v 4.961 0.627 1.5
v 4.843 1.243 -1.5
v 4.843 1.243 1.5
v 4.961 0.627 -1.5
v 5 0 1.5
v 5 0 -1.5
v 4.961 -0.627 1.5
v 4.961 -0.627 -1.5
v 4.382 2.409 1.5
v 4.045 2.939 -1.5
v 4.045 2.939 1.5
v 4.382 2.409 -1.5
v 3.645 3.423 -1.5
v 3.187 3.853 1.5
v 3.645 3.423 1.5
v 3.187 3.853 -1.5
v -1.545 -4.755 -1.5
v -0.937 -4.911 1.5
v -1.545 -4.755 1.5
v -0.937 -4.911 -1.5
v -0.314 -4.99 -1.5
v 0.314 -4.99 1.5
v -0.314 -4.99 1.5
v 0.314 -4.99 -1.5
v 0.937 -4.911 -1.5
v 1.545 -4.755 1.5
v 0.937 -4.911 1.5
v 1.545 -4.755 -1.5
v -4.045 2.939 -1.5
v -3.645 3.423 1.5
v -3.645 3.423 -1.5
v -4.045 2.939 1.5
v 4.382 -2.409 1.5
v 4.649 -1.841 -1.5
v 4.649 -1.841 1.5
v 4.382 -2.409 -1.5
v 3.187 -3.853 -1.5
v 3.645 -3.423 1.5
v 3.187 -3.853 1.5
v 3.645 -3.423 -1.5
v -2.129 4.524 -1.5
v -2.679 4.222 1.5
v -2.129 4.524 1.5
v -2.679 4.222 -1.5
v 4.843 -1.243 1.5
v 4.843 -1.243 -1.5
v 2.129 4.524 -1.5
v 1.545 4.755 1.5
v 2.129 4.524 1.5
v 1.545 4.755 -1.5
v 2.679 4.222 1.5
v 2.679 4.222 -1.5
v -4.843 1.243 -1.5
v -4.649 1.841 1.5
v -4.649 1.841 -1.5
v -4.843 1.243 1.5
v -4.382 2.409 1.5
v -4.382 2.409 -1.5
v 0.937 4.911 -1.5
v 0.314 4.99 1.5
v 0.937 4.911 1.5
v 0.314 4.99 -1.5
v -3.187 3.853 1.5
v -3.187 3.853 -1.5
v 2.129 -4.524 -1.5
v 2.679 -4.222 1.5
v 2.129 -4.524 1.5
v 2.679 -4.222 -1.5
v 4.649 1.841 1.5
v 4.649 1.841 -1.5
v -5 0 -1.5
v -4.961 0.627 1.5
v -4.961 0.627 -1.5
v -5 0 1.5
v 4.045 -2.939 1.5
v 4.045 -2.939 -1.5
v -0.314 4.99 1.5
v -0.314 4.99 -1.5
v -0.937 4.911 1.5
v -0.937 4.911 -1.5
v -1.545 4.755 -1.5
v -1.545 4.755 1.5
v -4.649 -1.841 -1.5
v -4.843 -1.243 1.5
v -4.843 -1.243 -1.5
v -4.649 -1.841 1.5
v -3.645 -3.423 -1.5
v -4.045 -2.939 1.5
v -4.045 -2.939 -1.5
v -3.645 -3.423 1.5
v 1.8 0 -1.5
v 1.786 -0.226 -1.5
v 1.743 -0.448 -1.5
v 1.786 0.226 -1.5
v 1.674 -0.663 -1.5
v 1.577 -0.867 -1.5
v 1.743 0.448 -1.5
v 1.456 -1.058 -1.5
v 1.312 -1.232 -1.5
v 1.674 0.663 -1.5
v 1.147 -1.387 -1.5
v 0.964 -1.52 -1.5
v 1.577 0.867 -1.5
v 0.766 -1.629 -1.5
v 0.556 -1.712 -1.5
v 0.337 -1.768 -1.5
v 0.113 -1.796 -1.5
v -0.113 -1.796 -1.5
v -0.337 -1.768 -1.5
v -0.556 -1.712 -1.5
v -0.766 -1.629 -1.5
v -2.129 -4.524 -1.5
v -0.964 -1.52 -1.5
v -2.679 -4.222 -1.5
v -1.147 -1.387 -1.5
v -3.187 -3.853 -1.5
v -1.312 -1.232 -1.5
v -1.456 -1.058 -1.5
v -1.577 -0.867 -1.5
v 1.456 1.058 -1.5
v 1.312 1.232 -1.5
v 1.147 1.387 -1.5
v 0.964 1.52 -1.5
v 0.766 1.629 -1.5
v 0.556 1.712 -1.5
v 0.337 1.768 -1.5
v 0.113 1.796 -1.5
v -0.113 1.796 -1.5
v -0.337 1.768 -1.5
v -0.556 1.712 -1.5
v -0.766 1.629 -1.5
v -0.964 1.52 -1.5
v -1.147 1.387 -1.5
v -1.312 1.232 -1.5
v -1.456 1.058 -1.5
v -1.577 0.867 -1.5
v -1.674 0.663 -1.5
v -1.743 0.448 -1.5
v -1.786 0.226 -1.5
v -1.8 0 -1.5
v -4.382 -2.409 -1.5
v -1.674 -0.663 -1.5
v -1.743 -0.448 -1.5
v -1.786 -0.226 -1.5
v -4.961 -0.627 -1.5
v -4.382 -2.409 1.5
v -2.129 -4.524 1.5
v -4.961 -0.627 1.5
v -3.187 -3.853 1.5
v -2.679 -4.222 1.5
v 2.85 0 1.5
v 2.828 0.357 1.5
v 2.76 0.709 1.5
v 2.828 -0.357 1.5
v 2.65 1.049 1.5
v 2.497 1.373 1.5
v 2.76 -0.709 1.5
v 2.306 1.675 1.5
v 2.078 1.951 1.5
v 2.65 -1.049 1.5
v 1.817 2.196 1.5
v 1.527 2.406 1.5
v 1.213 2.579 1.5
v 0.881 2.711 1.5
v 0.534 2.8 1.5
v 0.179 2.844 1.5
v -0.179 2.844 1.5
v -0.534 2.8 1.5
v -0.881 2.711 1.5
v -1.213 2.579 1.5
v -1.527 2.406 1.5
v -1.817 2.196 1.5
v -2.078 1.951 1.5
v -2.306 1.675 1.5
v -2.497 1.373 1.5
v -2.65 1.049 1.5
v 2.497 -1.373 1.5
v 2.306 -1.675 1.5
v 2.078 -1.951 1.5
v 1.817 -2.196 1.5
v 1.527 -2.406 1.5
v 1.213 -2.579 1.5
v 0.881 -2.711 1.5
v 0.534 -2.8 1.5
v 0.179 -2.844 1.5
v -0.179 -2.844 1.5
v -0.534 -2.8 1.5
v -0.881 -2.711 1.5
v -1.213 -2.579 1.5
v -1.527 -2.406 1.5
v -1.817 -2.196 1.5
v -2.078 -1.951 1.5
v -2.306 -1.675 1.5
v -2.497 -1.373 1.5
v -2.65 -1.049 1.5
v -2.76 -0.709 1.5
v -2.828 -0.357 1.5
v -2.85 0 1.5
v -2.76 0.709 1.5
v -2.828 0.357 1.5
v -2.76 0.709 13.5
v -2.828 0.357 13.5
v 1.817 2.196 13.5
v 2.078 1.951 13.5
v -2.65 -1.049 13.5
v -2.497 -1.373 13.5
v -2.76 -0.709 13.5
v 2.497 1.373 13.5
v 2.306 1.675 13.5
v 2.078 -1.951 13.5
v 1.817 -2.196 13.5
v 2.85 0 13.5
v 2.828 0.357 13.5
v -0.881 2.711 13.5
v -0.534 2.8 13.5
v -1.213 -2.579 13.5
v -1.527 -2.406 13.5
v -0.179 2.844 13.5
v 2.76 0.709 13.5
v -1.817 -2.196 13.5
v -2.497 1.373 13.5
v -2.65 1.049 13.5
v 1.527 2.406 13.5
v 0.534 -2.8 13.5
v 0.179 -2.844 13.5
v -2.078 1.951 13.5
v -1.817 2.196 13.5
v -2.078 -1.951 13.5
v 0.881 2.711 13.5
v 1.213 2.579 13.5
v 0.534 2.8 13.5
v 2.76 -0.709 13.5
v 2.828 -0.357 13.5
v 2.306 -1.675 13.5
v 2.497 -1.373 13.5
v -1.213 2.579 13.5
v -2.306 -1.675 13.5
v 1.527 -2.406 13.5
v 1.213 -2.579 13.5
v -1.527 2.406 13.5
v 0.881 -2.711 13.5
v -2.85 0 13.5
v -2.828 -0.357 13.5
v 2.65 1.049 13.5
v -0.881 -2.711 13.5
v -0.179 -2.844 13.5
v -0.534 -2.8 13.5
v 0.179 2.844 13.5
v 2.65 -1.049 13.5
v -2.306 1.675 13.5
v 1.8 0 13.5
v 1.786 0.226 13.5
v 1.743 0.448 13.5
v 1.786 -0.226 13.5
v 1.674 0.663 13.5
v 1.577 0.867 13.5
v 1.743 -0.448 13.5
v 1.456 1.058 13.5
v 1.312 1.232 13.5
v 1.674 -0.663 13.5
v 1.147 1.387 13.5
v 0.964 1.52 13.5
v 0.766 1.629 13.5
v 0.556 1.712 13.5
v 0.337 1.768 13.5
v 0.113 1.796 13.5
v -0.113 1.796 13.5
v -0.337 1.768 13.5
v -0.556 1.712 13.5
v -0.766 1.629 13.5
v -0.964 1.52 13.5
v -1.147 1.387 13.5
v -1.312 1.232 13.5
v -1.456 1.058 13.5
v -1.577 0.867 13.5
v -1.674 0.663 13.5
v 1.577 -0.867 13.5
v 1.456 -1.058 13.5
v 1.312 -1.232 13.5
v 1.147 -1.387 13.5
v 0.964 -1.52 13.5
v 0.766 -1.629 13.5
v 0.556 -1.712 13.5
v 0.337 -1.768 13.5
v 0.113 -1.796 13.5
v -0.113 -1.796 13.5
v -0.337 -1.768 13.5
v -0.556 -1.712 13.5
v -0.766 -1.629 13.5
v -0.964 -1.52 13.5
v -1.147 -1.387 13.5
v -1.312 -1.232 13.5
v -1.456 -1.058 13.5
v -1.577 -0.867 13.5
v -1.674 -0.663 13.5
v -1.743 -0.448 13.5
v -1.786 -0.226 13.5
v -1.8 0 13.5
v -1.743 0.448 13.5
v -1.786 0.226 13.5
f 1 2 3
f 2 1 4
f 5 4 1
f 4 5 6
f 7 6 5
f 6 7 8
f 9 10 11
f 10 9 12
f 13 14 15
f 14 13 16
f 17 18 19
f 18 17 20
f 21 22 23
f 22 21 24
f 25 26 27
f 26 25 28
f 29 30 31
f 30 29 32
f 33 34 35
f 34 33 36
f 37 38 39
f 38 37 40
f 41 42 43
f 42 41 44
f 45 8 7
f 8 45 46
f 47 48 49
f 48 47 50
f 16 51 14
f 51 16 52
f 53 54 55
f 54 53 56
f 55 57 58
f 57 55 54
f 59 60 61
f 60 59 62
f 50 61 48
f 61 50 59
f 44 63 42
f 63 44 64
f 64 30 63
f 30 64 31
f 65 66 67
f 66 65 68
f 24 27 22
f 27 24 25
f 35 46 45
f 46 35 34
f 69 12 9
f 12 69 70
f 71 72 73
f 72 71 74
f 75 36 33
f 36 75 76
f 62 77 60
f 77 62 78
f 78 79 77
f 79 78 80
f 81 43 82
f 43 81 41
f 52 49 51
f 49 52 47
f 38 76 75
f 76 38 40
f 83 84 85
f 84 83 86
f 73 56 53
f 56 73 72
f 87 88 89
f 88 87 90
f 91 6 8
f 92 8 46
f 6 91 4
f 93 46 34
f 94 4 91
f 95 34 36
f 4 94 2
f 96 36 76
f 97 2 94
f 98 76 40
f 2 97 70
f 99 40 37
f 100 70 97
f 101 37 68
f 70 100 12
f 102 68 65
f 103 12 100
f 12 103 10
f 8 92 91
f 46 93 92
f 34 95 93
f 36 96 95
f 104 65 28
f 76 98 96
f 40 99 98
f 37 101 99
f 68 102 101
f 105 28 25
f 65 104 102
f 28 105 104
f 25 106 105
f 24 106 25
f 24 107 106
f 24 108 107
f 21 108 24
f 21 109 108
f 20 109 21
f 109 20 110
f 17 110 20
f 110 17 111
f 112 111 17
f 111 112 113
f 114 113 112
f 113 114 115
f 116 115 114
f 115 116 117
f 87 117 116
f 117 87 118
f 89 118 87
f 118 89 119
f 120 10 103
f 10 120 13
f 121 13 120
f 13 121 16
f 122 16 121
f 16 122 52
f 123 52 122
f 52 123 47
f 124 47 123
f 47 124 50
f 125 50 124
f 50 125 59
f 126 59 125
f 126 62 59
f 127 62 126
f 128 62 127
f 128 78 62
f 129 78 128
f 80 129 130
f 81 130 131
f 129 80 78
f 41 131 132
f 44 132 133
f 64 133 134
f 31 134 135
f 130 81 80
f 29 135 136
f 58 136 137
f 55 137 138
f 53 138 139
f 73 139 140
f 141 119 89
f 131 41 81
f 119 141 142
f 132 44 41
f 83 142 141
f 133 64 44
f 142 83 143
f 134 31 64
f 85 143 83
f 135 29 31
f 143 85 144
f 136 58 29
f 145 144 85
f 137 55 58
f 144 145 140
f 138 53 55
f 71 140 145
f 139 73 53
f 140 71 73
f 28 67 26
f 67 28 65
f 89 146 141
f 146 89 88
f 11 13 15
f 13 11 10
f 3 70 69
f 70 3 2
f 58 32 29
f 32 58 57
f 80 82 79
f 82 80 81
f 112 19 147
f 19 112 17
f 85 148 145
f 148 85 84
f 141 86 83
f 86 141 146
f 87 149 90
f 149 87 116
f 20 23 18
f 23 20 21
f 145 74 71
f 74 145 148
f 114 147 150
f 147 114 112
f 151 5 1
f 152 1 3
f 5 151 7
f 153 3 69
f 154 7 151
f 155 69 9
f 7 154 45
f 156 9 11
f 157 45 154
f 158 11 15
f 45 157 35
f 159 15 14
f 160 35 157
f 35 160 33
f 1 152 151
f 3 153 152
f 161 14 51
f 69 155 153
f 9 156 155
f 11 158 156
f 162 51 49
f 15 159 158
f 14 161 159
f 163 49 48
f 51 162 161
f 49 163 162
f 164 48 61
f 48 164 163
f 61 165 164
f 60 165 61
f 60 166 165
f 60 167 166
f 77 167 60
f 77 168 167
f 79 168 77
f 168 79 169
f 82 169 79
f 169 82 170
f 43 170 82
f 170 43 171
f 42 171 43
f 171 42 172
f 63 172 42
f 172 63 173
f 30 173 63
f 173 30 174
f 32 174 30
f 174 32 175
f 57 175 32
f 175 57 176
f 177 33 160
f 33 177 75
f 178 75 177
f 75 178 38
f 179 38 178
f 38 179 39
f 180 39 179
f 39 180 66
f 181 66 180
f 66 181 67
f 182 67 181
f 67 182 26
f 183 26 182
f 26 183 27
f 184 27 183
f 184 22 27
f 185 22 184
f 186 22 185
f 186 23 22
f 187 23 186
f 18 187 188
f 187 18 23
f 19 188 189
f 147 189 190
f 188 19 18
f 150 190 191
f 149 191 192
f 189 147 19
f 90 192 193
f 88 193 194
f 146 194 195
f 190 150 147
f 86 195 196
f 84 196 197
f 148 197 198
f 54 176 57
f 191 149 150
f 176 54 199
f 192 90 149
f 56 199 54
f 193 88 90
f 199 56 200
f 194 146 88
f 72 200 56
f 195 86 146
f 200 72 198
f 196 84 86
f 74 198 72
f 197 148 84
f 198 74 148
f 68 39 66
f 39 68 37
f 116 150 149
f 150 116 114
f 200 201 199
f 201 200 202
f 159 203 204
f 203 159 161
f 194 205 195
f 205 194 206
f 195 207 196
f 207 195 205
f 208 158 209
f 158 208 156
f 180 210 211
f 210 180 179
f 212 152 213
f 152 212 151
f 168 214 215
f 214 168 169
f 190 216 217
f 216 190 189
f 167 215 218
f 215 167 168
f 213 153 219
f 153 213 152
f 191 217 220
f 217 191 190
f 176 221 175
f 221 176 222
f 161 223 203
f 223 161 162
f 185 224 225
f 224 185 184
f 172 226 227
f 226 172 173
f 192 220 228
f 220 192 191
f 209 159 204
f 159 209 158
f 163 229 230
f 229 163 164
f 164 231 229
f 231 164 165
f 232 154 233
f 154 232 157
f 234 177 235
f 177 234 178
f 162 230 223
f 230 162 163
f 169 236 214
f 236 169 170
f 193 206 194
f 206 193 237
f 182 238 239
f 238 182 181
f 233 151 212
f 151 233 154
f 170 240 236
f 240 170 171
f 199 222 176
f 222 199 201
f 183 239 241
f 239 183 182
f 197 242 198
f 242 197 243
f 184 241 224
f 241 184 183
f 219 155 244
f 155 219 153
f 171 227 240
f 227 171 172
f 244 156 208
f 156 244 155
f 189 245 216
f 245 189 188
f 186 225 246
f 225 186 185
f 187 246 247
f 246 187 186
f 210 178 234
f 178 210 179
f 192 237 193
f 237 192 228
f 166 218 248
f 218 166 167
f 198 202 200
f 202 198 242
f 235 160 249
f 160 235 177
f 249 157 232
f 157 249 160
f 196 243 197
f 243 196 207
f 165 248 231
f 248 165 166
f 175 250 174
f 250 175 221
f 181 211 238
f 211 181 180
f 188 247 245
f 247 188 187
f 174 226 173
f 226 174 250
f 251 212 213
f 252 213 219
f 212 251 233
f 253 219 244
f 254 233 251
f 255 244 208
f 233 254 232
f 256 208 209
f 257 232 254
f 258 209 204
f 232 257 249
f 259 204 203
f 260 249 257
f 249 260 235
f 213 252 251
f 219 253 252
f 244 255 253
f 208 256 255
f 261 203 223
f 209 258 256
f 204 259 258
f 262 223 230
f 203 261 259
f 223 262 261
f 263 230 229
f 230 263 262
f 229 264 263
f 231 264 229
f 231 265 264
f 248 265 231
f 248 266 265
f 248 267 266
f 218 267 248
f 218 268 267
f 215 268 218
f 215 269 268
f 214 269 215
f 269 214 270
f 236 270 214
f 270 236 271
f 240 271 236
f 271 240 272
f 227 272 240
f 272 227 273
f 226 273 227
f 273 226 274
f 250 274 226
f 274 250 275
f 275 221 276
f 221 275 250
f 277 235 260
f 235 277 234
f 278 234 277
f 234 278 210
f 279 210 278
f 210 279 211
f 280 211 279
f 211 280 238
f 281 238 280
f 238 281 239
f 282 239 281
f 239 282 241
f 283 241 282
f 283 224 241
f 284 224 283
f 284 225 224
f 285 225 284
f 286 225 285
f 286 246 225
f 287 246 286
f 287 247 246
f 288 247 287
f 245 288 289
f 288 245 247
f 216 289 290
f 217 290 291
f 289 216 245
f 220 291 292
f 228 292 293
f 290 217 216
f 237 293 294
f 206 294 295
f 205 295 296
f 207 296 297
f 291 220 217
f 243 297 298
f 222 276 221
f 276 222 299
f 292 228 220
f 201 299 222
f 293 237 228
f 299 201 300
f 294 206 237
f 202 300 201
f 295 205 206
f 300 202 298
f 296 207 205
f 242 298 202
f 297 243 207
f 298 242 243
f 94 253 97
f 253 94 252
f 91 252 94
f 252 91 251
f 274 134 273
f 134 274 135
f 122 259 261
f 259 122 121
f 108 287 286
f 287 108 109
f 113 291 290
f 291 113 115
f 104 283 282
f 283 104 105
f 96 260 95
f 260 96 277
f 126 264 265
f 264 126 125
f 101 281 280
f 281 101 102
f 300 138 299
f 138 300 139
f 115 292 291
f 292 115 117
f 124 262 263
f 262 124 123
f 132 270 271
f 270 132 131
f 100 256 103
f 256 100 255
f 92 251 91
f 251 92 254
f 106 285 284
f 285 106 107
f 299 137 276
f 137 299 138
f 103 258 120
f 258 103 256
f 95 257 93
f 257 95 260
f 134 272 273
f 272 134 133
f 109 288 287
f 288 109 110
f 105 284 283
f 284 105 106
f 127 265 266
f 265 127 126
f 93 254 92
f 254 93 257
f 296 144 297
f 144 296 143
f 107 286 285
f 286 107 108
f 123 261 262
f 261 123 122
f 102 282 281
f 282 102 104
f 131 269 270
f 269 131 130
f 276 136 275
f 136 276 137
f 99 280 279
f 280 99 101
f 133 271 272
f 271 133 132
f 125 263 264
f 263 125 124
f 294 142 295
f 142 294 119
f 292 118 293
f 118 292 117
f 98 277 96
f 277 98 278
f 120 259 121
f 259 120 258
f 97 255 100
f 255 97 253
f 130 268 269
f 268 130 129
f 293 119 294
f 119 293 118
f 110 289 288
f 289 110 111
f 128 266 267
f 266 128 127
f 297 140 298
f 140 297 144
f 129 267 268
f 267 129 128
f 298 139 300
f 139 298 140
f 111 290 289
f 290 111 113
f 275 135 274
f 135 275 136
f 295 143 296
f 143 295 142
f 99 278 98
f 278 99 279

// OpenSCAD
$fn = 50;


difference() {
	union() {
		translate(v = [0, 0, -1.5000000000]) {
			rotate(a = [0, 0, 0]) {
				cylinder(h = 3, r = 5.0000000000);
			}
		}
		translate(v = [0, 0, -1.5000000000]) {
			rotate(a = [0, 0, 0]) {
				cylinder(h = 15, r = 2.8500000000);
			}
		}
	}
	union() {
		translate(v = [0, 0, -125.0000000000]) {
			rotate(a = [0, 0, 0]) {
				cylinder(h = 250, r = 1.8000000000);
			}
		}
	}
}
